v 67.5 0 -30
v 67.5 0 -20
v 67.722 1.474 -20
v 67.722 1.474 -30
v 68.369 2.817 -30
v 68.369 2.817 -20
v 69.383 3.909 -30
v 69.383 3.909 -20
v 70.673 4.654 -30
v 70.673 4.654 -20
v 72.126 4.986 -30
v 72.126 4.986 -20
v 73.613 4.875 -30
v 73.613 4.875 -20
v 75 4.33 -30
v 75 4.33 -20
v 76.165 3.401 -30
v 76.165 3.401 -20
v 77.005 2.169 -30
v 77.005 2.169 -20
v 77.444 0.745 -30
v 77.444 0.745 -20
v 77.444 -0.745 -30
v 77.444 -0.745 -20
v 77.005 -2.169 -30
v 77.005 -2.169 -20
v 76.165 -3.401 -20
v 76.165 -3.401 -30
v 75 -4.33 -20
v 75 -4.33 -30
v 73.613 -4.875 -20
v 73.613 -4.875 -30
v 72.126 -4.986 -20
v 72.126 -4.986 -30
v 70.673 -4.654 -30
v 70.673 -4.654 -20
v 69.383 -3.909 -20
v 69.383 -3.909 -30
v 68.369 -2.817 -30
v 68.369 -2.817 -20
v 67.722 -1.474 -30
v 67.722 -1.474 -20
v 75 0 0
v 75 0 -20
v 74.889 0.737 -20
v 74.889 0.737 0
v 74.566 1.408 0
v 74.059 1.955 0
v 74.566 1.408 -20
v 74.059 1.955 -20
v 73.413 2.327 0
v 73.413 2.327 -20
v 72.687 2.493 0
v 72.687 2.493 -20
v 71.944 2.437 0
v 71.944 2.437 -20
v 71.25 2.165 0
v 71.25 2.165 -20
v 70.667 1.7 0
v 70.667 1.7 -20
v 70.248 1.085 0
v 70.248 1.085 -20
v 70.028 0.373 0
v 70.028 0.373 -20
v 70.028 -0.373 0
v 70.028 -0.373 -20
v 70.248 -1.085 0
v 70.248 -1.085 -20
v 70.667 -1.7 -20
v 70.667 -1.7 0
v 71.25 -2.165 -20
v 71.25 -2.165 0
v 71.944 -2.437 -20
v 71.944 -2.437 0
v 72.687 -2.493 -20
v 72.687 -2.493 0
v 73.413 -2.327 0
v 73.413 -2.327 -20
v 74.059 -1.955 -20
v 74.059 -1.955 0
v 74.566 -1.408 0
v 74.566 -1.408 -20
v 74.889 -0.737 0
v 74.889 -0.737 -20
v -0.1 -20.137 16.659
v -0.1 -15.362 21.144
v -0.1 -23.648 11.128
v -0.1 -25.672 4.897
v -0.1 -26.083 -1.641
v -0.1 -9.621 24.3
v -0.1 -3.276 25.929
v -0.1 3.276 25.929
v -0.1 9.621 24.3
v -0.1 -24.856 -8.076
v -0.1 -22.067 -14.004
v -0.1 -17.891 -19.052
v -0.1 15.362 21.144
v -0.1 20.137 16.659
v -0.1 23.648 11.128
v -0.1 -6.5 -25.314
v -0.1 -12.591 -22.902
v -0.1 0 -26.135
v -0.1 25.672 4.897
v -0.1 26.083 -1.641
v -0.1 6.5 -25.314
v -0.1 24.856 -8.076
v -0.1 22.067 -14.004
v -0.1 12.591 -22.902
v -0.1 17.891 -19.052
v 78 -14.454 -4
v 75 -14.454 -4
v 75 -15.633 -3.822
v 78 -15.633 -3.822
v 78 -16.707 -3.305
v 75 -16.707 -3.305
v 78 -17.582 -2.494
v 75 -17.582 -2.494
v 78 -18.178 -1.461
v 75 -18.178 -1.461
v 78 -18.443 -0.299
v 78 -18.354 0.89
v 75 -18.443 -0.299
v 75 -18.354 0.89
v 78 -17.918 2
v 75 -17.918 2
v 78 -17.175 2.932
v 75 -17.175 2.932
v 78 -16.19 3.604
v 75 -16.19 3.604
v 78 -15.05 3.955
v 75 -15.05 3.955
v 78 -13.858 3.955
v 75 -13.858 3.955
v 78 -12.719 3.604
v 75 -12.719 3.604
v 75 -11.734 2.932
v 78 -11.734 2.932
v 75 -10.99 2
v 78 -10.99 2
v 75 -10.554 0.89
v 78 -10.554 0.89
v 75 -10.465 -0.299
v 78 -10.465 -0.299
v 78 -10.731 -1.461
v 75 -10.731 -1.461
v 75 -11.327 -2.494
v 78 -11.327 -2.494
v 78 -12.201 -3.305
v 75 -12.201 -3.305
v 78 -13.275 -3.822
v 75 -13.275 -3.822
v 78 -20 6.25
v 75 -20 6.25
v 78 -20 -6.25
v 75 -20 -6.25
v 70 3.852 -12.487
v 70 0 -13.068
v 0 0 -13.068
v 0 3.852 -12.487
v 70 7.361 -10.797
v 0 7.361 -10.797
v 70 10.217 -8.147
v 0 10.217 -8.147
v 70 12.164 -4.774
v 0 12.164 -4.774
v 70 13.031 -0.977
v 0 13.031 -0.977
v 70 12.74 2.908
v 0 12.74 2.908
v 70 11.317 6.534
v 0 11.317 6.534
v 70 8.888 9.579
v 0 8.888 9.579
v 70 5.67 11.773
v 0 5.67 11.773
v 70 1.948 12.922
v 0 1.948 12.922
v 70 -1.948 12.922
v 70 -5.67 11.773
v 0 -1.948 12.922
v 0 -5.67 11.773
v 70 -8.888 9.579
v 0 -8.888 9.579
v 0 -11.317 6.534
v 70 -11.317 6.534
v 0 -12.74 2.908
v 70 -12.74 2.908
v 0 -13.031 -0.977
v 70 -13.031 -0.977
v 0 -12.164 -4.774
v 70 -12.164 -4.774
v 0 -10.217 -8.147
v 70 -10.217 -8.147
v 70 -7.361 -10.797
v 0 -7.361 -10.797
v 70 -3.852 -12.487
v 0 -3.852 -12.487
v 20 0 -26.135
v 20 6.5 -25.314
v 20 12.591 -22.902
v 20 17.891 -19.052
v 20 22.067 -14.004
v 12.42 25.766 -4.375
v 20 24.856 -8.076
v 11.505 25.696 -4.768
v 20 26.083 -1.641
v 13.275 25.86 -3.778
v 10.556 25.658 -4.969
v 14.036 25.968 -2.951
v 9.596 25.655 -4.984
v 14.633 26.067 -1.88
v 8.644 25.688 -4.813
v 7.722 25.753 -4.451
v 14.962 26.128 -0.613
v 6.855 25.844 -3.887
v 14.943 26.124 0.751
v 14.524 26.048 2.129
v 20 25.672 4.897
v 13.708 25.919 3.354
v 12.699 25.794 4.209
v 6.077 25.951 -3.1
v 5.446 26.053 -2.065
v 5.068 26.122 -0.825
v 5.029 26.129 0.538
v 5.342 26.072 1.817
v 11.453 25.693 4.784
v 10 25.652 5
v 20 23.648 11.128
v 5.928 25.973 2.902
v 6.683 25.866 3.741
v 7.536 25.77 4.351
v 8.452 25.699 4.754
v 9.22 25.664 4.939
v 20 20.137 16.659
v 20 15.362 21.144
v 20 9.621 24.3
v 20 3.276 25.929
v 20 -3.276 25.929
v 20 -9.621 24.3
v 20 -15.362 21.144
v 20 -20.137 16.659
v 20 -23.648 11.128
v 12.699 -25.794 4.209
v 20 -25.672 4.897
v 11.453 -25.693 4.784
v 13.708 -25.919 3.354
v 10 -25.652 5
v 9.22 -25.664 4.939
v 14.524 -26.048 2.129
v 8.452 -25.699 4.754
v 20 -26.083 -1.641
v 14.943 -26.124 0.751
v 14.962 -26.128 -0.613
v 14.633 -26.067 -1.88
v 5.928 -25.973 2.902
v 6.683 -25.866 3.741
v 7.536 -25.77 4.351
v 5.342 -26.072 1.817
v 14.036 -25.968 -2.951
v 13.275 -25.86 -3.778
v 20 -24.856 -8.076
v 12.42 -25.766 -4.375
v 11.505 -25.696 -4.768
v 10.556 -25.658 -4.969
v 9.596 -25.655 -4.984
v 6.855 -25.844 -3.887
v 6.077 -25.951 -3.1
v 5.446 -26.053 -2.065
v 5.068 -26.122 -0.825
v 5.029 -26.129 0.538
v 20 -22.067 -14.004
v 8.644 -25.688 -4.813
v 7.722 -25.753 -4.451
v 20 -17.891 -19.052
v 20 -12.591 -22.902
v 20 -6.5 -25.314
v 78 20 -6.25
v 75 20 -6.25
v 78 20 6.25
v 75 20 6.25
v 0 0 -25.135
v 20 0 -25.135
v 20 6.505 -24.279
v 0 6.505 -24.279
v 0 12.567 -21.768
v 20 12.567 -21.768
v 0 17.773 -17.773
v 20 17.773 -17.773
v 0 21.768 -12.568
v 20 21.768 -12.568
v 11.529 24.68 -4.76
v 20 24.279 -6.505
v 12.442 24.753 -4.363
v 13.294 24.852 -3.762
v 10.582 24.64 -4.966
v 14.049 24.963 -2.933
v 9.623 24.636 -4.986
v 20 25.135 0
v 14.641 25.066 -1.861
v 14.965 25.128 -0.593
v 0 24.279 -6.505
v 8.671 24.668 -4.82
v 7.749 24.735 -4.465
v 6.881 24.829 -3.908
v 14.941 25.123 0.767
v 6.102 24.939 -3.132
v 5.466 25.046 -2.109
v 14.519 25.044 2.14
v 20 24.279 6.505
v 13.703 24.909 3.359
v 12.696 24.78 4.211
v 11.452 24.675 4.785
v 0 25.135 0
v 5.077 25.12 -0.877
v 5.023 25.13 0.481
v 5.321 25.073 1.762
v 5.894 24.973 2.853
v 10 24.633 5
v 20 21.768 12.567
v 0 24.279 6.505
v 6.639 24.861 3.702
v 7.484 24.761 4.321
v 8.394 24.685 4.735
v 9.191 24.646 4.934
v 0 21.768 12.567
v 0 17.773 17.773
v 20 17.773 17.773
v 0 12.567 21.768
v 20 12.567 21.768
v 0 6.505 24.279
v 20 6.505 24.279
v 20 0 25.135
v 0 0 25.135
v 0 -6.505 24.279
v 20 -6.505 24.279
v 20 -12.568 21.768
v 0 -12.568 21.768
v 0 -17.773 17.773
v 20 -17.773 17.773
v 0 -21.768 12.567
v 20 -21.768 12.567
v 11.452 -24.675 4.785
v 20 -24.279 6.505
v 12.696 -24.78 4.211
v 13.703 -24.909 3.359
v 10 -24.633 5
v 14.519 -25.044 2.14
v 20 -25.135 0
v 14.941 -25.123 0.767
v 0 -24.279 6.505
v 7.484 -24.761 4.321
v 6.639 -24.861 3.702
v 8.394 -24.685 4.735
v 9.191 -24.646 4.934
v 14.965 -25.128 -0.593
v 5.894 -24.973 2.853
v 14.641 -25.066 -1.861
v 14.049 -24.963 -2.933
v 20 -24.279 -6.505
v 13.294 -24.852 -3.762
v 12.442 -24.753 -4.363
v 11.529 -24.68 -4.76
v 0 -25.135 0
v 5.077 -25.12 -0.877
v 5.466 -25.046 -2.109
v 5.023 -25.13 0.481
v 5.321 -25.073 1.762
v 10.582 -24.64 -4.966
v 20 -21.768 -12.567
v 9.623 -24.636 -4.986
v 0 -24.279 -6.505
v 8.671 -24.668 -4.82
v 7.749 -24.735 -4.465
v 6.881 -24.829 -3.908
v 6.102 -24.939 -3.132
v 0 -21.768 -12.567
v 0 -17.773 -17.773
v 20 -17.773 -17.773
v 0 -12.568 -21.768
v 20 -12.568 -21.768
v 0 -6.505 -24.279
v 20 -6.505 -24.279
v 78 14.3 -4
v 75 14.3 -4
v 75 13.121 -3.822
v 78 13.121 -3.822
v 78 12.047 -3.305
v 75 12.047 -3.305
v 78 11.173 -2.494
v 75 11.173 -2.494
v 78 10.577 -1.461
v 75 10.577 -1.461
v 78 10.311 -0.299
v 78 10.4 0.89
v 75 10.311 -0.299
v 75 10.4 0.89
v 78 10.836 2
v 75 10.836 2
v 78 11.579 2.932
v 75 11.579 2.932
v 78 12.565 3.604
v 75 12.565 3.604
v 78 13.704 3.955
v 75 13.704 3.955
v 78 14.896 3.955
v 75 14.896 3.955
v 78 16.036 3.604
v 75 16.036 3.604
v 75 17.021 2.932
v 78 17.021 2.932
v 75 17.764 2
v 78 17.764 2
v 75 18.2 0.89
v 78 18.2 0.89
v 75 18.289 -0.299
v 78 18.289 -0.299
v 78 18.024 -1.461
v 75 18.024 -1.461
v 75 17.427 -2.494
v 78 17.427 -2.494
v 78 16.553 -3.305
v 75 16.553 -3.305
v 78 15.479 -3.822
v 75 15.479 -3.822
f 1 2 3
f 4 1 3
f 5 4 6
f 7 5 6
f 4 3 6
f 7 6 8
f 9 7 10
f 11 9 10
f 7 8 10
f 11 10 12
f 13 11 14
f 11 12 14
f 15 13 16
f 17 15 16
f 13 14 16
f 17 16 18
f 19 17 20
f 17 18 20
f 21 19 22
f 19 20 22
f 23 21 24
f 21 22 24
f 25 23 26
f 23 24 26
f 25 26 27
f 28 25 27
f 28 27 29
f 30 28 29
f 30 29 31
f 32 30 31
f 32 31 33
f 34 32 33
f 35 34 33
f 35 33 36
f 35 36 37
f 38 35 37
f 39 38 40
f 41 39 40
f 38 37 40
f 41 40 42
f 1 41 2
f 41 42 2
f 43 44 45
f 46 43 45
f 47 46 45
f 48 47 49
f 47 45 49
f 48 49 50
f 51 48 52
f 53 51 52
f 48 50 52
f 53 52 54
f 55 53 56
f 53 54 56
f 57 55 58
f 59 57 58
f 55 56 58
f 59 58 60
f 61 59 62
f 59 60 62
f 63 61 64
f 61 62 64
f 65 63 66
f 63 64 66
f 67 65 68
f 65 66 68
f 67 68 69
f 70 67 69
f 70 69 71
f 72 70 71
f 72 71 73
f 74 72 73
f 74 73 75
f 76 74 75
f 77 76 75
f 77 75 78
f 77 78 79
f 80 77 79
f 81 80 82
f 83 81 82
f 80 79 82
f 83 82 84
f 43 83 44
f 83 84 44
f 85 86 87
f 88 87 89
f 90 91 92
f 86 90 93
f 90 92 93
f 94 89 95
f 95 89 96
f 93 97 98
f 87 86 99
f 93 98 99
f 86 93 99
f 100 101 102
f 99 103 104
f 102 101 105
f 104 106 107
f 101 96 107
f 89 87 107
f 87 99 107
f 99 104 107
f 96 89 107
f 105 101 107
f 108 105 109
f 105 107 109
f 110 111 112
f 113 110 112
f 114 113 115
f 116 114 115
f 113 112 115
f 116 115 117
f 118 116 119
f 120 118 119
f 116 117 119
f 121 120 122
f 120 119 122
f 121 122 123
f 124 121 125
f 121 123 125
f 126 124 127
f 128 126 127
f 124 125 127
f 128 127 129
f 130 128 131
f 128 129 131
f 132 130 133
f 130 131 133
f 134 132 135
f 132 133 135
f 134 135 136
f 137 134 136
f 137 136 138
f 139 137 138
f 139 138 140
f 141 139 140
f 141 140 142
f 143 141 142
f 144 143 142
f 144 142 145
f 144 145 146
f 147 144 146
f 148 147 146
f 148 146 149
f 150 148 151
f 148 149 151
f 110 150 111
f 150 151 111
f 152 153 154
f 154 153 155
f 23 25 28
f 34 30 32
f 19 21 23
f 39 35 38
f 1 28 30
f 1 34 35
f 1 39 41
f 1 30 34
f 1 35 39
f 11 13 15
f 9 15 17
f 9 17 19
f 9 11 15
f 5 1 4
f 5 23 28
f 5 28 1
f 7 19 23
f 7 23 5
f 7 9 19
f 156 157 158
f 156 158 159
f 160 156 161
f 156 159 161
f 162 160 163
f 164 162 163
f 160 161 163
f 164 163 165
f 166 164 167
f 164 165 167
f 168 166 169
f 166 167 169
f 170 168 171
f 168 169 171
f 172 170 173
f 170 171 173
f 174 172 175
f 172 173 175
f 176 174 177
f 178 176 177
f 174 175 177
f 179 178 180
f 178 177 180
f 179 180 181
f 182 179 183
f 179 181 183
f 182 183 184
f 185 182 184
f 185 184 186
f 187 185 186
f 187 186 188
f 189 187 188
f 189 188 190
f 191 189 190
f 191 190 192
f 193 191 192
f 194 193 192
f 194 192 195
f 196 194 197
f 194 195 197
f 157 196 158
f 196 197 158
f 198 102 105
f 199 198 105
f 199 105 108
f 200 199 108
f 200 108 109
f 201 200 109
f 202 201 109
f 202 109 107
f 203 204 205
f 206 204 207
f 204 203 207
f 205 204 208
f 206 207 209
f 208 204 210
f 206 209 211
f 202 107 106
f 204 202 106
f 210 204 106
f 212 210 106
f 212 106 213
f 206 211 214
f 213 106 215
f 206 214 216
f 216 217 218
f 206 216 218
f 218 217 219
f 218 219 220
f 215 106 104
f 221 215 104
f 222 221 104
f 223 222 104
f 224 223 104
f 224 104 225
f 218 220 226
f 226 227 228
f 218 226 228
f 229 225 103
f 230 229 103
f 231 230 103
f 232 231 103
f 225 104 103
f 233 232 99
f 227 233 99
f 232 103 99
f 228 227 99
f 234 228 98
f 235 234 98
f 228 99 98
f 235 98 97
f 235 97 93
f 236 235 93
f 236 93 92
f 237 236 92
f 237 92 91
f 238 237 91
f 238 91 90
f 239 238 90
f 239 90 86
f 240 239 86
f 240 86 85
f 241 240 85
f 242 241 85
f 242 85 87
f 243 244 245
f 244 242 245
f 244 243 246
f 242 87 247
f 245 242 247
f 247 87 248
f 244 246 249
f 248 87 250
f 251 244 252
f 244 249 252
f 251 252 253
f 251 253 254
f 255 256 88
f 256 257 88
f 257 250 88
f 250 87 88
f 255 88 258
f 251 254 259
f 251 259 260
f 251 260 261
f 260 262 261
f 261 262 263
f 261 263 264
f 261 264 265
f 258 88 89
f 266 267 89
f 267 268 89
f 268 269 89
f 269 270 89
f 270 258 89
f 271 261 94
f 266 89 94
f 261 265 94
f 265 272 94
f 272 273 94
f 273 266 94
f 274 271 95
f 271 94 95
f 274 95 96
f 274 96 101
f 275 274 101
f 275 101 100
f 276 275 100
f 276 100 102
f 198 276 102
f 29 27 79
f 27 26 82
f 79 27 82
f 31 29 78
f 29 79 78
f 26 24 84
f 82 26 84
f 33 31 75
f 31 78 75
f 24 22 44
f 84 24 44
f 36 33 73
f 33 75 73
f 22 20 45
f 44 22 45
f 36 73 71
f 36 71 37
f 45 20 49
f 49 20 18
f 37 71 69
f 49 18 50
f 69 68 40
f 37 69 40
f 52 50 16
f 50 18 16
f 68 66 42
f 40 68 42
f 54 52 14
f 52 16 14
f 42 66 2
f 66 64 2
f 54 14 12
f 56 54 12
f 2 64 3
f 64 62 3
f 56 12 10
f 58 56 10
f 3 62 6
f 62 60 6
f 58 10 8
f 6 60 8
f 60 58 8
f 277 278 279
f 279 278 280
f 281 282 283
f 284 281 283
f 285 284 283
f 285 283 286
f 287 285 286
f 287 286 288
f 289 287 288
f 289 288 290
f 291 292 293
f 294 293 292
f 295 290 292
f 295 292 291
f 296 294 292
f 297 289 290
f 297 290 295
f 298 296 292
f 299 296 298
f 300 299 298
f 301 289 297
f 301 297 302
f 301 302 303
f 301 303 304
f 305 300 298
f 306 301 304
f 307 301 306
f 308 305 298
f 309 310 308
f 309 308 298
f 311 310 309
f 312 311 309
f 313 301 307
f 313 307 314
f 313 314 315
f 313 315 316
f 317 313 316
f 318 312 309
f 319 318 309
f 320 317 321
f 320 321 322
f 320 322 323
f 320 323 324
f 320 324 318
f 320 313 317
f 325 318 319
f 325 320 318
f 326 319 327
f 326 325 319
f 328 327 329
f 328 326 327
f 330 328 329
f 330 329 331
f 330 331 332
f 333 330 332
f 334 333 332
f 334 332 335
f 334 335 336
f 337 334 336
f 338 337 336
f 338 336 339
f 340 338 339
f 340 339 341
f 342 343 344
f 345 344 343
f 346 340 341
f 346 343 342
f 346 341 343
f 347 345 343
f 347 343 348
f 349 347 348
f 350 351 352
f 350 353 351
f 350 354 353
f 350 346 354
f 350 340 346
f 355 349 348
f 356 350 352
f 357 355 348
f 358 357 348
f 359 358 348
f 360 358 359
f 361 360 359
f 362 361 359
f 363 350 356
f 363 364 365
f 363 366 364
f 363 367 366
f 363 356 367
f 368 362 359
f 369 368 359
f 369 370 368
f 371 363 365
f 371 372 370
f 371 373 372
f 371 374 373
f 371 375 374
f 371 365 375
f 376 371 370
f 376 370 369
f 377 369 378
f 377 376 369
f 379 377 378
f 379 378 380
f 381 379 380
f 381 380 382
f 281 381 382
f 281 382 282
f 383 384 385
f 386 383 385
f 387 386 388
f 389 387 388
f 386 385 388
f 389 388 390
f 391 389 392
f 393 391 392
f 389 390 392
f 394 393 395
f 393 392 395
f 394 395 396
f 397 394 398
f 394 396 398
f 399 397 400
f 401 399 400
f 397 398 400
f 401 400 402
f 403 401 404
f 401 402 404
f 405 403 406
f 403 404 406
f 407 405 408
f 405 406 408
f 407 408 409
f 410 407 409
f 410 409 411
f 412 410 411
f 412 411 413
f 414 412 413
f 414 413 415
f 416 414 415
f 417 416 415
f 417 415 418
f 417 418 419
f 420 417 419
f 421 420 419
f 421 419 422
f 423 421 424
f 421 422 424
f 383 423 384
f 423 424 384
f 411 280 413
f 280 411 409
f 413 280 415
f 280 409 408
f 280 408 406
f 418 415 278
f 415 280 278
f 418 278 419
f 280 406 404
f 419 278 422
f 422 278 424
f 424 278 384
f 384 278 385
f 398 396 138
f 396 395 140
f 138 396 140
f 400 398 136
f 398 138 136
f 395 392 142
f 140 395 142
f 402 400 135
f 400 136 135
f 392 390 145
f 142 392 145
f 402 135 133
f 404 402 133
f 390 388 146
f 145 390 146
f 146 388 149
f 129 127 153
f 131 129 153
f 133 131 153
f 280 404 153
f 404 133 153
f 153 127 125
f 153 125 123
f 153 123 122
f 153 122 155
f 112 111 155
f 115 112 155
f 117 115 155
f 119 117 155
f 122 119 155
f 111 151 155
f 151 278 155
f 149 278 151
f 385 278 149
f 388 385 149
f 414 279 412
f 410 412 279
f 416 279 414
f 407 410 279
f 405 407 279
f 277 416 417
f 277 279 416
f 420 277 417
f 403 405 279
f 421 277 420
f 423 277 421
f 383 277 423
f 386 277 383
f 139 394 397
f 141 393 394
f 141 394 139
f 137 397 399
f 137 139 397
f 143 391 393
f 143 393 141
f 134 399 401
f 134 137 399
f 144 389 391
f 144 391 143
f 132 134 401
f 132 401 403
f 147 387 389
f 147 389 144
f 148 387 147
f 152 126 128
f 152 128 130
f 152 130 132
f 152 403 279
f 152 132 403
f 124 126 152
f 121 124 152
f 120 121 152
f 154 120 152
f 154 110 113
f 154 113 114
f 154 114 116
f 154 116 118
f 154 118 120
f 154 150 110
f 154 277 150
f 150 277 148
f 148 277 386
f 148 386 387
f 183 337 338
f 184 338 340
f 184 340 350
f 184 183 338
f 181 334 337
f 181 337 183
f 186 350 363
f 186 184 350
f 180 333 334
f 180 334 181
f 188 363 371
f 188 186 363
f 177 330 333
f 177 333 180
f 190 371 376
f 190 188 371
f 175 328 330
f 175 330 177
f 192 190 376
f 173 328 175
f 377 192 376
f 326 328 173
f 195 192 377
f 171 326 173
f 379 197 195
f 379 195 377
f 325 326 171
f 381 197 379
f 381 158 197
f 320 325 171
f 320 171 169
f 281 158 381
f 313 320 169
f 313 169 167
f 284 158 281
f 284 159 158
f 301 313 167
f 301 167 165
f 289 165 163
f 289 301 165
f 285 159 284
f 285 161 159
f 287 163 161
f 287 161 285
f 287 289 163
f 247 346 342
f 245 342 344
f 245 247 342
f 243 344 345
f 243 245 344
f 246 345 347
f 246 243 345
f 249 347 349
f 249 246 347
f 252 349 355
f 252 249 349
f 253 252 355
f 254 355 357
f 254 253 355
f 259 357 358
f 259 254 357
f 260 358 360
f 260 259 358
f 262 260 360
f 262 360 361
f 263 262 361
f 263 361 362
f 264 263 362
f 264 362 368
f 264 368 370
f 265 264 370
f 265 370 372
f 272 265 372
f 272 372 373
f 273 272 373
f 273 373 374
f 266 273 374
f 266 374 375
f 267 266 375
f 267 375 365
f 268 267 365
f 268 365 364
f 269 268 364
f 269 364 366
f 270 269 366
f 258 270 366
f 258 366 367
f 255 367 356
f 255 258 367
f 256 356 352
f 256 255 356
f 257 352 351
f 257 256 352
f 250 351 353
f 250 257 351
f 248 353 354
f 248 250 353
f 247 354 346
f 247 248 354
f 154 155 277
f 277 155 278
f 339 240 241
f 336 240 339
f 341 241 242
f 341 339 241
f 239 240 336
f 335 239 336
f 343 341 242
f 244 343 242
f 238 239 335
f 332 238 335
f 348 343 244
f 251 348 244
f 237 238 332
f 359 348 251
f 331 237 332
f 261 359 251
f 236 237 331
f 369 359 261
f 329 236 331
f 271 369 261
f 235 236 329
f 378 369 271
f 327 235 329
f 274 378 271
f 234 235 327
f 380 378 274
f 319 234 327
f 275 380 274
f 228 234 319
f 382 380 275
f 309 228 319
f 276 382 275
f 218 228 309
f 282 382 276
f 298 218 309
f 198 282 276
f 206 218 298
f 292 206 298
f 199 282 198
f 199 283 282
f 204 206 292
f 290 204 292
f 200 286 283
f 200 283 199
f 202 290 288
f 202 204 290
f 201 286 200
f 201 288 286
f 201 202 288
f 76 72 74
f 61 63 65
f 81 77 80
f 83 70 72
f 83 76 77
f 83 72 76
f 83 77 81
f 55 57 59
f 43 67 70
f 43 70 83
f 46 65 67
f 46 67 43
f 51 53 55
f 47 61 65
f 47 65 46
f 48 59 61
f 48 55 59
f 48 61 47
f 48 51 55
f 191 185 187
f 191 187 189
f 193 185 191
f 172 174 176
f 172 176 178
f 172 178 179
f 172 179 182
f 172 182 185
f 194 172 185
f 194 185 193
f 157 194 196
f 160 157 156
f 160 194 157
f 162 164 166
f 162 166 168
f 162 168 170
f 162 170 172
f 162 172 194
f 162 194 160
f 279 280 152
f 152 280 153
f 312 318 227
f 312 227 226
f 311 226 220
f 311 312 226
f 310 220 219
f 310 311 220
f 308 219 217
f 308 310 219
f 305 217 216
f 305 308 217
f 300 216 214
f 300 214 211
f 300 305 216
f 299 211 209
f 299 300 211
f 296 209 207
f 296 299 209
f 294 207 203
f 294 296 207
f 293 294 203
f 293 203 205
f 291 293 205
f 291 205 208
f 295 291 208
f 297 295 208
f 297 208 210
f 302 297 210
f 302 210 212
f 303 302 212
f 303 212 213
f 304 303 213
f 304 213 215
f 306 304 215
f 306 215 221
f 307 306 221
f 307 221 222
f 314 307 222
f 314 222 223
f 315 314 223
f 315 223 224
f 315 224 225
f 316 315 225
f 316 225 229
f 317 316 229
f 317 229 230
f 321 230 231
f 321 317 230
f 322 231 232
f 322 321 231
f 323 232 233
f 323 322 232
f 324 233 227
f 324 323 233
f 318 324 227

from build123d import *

# Parameters (mm, degrees)
SKETCH1_R               = 26.135
SKETCH1_R_2             = 25.135
EXTRUDE_THIN1_DEPTH     = 20
BOSS_EXTRUDE1_START     = -0.1
SKETCH3_R               = 26.135
BOSS_EXTRUDE1_DEPTH     = 0.1
CUT_EXTRUDE1_DEPTH      = 43.024712373
CUT_EXTRUDE1_DEPTH_BACK = 43.024712373
SKETCH4_R               = 5
SKETCH7_R               = 13.0675
BOSS_EXTRUDE2_DEPTH     = 70
BOSS_EXTRUDE3_START     = -20
BOSS_EXTRUDE3_OUTLINE_R = 2.5
BOSS_EXTRUDE3_DEPTH     = 20
SKETCH8_R               = 5
BOSS_EXTRUDE4_DEPTH     = 10
F_3DSKETCH2_R           = 4
BOSS_EXTRUDE5_DEPTH     = 3


# Read off the part's stored shape, not the designer's step: Boss-Extrude3
with BuildPart() as part:
    # Sketch1 → Extrude-Thin1 (new body)
    with BuildSketch(Plane(origin=(0, 0, 0), x_dir=(0, 0, -1), z_dir=(1, 0, 0))):
        Circle(SKETCH1_R)
        Circle(SKETCH1_R_2, mode=Mode.SUBTRACT)
    extrude(amount=EXTRUDE_THIN1_DEPTH)

    # Sketch3 → Boss-Extrude1 (add)
    with BuildSketch(Plane(origin=(0, 0, 0), x_dir=(0, 0, -1), z_dir=(1, 0, 0)).offset(BOSS_EXTRUDE1_START)):
        Circle(SKETCH3_R)
    extrude(amount=BOSS_EXTRUDE1_DEPTH)

    # Sketch4 → Cut-Extrude1 (cut, two sides: drawn at the far end of the back side and taken through both)
    with BuildSketch(Plane(origin=(0, 0, 0), x_dir=(1, 0, 0), z_dir=(0, 1, 0)).offset(-CUT_EXTRUDE1_DEPTH_BACK)):
        with Locations(Location((10, 0, 0), (0, 0, 270))):
            Circle(SKETCH4_R)
    extrude(amount=CUT_EXTRUDE1_DEPTH + CUT_EXTRUDE1_DEPTH_BACK, mode=Mode.SUBTRACT)

    # Sketch7 → Boss-Extrude2 (add)
    with BuildSketch(Plane(origin=(0, 0, 0), x_dir=(0, 0, -1), z_dir=(1, 0, 0))):
        Circle(SKETCH7_R)
    extrude(amount=BOSS_EXTRUDE2_DEPTH)


with BuildPart() as body_2:
    # Boss-Extrude3 outline → Boss-Extrude3 (new body)
    with BuildSketch(Plane.XY.offset(BOSS_EXTRUDE3_START)):
        with Locations((72.5, 0)):
            Circle(BOSS_EXTRUDE3_OUTLINE_R)
    extrude(amount=BOSS_EXTRUDE3_DEPTH)

    # Sketch8 → Boss-Extrude4 (add)
    with BuildSketch(Plane(origin=(0, 0, -20), x_dir=(-1, 0, 0), z_dir=(0, 0, -1))):
        with Locations((-72.5, 0)):
            Circle(SKETCH8_R)
    extrude(amount=BOSS_EXTRUDE4_DEPTH)


with BuildPart() as body_3:
    # 3DSketch2 → Boss-Extrude5 (new body)
    with BuildSketch(Plane(origin=(75, -20, 6.25), x_dir=(0, 0.9544799780350297, -0.2982749931359468), z_dir=(-1, 0, 0))):
        Polygon((0, 0), (3.728437414, 11.930999725), (41.907636536, 0), (38.179199121, -11.930999725), align=None)
        with Locations(Location((34.602959725, -4.265356706, 0), (0, 0, 72.645975364))):
            Circle(F_3DSKETCH2_R, mode=Mode.SUBTRACT)
        with Locations(Location((7.157563346, 4.311329663, 0), (0, 0, 72.645975364))):
            Circle(F_3DSKETCH2_R, mode=Mode.SUBTRACT)
    extrude(amount=-BOSS_EXTRUDE5_DEPTH)


solid = Compound([part.part, body_2.part, body_3.part])
